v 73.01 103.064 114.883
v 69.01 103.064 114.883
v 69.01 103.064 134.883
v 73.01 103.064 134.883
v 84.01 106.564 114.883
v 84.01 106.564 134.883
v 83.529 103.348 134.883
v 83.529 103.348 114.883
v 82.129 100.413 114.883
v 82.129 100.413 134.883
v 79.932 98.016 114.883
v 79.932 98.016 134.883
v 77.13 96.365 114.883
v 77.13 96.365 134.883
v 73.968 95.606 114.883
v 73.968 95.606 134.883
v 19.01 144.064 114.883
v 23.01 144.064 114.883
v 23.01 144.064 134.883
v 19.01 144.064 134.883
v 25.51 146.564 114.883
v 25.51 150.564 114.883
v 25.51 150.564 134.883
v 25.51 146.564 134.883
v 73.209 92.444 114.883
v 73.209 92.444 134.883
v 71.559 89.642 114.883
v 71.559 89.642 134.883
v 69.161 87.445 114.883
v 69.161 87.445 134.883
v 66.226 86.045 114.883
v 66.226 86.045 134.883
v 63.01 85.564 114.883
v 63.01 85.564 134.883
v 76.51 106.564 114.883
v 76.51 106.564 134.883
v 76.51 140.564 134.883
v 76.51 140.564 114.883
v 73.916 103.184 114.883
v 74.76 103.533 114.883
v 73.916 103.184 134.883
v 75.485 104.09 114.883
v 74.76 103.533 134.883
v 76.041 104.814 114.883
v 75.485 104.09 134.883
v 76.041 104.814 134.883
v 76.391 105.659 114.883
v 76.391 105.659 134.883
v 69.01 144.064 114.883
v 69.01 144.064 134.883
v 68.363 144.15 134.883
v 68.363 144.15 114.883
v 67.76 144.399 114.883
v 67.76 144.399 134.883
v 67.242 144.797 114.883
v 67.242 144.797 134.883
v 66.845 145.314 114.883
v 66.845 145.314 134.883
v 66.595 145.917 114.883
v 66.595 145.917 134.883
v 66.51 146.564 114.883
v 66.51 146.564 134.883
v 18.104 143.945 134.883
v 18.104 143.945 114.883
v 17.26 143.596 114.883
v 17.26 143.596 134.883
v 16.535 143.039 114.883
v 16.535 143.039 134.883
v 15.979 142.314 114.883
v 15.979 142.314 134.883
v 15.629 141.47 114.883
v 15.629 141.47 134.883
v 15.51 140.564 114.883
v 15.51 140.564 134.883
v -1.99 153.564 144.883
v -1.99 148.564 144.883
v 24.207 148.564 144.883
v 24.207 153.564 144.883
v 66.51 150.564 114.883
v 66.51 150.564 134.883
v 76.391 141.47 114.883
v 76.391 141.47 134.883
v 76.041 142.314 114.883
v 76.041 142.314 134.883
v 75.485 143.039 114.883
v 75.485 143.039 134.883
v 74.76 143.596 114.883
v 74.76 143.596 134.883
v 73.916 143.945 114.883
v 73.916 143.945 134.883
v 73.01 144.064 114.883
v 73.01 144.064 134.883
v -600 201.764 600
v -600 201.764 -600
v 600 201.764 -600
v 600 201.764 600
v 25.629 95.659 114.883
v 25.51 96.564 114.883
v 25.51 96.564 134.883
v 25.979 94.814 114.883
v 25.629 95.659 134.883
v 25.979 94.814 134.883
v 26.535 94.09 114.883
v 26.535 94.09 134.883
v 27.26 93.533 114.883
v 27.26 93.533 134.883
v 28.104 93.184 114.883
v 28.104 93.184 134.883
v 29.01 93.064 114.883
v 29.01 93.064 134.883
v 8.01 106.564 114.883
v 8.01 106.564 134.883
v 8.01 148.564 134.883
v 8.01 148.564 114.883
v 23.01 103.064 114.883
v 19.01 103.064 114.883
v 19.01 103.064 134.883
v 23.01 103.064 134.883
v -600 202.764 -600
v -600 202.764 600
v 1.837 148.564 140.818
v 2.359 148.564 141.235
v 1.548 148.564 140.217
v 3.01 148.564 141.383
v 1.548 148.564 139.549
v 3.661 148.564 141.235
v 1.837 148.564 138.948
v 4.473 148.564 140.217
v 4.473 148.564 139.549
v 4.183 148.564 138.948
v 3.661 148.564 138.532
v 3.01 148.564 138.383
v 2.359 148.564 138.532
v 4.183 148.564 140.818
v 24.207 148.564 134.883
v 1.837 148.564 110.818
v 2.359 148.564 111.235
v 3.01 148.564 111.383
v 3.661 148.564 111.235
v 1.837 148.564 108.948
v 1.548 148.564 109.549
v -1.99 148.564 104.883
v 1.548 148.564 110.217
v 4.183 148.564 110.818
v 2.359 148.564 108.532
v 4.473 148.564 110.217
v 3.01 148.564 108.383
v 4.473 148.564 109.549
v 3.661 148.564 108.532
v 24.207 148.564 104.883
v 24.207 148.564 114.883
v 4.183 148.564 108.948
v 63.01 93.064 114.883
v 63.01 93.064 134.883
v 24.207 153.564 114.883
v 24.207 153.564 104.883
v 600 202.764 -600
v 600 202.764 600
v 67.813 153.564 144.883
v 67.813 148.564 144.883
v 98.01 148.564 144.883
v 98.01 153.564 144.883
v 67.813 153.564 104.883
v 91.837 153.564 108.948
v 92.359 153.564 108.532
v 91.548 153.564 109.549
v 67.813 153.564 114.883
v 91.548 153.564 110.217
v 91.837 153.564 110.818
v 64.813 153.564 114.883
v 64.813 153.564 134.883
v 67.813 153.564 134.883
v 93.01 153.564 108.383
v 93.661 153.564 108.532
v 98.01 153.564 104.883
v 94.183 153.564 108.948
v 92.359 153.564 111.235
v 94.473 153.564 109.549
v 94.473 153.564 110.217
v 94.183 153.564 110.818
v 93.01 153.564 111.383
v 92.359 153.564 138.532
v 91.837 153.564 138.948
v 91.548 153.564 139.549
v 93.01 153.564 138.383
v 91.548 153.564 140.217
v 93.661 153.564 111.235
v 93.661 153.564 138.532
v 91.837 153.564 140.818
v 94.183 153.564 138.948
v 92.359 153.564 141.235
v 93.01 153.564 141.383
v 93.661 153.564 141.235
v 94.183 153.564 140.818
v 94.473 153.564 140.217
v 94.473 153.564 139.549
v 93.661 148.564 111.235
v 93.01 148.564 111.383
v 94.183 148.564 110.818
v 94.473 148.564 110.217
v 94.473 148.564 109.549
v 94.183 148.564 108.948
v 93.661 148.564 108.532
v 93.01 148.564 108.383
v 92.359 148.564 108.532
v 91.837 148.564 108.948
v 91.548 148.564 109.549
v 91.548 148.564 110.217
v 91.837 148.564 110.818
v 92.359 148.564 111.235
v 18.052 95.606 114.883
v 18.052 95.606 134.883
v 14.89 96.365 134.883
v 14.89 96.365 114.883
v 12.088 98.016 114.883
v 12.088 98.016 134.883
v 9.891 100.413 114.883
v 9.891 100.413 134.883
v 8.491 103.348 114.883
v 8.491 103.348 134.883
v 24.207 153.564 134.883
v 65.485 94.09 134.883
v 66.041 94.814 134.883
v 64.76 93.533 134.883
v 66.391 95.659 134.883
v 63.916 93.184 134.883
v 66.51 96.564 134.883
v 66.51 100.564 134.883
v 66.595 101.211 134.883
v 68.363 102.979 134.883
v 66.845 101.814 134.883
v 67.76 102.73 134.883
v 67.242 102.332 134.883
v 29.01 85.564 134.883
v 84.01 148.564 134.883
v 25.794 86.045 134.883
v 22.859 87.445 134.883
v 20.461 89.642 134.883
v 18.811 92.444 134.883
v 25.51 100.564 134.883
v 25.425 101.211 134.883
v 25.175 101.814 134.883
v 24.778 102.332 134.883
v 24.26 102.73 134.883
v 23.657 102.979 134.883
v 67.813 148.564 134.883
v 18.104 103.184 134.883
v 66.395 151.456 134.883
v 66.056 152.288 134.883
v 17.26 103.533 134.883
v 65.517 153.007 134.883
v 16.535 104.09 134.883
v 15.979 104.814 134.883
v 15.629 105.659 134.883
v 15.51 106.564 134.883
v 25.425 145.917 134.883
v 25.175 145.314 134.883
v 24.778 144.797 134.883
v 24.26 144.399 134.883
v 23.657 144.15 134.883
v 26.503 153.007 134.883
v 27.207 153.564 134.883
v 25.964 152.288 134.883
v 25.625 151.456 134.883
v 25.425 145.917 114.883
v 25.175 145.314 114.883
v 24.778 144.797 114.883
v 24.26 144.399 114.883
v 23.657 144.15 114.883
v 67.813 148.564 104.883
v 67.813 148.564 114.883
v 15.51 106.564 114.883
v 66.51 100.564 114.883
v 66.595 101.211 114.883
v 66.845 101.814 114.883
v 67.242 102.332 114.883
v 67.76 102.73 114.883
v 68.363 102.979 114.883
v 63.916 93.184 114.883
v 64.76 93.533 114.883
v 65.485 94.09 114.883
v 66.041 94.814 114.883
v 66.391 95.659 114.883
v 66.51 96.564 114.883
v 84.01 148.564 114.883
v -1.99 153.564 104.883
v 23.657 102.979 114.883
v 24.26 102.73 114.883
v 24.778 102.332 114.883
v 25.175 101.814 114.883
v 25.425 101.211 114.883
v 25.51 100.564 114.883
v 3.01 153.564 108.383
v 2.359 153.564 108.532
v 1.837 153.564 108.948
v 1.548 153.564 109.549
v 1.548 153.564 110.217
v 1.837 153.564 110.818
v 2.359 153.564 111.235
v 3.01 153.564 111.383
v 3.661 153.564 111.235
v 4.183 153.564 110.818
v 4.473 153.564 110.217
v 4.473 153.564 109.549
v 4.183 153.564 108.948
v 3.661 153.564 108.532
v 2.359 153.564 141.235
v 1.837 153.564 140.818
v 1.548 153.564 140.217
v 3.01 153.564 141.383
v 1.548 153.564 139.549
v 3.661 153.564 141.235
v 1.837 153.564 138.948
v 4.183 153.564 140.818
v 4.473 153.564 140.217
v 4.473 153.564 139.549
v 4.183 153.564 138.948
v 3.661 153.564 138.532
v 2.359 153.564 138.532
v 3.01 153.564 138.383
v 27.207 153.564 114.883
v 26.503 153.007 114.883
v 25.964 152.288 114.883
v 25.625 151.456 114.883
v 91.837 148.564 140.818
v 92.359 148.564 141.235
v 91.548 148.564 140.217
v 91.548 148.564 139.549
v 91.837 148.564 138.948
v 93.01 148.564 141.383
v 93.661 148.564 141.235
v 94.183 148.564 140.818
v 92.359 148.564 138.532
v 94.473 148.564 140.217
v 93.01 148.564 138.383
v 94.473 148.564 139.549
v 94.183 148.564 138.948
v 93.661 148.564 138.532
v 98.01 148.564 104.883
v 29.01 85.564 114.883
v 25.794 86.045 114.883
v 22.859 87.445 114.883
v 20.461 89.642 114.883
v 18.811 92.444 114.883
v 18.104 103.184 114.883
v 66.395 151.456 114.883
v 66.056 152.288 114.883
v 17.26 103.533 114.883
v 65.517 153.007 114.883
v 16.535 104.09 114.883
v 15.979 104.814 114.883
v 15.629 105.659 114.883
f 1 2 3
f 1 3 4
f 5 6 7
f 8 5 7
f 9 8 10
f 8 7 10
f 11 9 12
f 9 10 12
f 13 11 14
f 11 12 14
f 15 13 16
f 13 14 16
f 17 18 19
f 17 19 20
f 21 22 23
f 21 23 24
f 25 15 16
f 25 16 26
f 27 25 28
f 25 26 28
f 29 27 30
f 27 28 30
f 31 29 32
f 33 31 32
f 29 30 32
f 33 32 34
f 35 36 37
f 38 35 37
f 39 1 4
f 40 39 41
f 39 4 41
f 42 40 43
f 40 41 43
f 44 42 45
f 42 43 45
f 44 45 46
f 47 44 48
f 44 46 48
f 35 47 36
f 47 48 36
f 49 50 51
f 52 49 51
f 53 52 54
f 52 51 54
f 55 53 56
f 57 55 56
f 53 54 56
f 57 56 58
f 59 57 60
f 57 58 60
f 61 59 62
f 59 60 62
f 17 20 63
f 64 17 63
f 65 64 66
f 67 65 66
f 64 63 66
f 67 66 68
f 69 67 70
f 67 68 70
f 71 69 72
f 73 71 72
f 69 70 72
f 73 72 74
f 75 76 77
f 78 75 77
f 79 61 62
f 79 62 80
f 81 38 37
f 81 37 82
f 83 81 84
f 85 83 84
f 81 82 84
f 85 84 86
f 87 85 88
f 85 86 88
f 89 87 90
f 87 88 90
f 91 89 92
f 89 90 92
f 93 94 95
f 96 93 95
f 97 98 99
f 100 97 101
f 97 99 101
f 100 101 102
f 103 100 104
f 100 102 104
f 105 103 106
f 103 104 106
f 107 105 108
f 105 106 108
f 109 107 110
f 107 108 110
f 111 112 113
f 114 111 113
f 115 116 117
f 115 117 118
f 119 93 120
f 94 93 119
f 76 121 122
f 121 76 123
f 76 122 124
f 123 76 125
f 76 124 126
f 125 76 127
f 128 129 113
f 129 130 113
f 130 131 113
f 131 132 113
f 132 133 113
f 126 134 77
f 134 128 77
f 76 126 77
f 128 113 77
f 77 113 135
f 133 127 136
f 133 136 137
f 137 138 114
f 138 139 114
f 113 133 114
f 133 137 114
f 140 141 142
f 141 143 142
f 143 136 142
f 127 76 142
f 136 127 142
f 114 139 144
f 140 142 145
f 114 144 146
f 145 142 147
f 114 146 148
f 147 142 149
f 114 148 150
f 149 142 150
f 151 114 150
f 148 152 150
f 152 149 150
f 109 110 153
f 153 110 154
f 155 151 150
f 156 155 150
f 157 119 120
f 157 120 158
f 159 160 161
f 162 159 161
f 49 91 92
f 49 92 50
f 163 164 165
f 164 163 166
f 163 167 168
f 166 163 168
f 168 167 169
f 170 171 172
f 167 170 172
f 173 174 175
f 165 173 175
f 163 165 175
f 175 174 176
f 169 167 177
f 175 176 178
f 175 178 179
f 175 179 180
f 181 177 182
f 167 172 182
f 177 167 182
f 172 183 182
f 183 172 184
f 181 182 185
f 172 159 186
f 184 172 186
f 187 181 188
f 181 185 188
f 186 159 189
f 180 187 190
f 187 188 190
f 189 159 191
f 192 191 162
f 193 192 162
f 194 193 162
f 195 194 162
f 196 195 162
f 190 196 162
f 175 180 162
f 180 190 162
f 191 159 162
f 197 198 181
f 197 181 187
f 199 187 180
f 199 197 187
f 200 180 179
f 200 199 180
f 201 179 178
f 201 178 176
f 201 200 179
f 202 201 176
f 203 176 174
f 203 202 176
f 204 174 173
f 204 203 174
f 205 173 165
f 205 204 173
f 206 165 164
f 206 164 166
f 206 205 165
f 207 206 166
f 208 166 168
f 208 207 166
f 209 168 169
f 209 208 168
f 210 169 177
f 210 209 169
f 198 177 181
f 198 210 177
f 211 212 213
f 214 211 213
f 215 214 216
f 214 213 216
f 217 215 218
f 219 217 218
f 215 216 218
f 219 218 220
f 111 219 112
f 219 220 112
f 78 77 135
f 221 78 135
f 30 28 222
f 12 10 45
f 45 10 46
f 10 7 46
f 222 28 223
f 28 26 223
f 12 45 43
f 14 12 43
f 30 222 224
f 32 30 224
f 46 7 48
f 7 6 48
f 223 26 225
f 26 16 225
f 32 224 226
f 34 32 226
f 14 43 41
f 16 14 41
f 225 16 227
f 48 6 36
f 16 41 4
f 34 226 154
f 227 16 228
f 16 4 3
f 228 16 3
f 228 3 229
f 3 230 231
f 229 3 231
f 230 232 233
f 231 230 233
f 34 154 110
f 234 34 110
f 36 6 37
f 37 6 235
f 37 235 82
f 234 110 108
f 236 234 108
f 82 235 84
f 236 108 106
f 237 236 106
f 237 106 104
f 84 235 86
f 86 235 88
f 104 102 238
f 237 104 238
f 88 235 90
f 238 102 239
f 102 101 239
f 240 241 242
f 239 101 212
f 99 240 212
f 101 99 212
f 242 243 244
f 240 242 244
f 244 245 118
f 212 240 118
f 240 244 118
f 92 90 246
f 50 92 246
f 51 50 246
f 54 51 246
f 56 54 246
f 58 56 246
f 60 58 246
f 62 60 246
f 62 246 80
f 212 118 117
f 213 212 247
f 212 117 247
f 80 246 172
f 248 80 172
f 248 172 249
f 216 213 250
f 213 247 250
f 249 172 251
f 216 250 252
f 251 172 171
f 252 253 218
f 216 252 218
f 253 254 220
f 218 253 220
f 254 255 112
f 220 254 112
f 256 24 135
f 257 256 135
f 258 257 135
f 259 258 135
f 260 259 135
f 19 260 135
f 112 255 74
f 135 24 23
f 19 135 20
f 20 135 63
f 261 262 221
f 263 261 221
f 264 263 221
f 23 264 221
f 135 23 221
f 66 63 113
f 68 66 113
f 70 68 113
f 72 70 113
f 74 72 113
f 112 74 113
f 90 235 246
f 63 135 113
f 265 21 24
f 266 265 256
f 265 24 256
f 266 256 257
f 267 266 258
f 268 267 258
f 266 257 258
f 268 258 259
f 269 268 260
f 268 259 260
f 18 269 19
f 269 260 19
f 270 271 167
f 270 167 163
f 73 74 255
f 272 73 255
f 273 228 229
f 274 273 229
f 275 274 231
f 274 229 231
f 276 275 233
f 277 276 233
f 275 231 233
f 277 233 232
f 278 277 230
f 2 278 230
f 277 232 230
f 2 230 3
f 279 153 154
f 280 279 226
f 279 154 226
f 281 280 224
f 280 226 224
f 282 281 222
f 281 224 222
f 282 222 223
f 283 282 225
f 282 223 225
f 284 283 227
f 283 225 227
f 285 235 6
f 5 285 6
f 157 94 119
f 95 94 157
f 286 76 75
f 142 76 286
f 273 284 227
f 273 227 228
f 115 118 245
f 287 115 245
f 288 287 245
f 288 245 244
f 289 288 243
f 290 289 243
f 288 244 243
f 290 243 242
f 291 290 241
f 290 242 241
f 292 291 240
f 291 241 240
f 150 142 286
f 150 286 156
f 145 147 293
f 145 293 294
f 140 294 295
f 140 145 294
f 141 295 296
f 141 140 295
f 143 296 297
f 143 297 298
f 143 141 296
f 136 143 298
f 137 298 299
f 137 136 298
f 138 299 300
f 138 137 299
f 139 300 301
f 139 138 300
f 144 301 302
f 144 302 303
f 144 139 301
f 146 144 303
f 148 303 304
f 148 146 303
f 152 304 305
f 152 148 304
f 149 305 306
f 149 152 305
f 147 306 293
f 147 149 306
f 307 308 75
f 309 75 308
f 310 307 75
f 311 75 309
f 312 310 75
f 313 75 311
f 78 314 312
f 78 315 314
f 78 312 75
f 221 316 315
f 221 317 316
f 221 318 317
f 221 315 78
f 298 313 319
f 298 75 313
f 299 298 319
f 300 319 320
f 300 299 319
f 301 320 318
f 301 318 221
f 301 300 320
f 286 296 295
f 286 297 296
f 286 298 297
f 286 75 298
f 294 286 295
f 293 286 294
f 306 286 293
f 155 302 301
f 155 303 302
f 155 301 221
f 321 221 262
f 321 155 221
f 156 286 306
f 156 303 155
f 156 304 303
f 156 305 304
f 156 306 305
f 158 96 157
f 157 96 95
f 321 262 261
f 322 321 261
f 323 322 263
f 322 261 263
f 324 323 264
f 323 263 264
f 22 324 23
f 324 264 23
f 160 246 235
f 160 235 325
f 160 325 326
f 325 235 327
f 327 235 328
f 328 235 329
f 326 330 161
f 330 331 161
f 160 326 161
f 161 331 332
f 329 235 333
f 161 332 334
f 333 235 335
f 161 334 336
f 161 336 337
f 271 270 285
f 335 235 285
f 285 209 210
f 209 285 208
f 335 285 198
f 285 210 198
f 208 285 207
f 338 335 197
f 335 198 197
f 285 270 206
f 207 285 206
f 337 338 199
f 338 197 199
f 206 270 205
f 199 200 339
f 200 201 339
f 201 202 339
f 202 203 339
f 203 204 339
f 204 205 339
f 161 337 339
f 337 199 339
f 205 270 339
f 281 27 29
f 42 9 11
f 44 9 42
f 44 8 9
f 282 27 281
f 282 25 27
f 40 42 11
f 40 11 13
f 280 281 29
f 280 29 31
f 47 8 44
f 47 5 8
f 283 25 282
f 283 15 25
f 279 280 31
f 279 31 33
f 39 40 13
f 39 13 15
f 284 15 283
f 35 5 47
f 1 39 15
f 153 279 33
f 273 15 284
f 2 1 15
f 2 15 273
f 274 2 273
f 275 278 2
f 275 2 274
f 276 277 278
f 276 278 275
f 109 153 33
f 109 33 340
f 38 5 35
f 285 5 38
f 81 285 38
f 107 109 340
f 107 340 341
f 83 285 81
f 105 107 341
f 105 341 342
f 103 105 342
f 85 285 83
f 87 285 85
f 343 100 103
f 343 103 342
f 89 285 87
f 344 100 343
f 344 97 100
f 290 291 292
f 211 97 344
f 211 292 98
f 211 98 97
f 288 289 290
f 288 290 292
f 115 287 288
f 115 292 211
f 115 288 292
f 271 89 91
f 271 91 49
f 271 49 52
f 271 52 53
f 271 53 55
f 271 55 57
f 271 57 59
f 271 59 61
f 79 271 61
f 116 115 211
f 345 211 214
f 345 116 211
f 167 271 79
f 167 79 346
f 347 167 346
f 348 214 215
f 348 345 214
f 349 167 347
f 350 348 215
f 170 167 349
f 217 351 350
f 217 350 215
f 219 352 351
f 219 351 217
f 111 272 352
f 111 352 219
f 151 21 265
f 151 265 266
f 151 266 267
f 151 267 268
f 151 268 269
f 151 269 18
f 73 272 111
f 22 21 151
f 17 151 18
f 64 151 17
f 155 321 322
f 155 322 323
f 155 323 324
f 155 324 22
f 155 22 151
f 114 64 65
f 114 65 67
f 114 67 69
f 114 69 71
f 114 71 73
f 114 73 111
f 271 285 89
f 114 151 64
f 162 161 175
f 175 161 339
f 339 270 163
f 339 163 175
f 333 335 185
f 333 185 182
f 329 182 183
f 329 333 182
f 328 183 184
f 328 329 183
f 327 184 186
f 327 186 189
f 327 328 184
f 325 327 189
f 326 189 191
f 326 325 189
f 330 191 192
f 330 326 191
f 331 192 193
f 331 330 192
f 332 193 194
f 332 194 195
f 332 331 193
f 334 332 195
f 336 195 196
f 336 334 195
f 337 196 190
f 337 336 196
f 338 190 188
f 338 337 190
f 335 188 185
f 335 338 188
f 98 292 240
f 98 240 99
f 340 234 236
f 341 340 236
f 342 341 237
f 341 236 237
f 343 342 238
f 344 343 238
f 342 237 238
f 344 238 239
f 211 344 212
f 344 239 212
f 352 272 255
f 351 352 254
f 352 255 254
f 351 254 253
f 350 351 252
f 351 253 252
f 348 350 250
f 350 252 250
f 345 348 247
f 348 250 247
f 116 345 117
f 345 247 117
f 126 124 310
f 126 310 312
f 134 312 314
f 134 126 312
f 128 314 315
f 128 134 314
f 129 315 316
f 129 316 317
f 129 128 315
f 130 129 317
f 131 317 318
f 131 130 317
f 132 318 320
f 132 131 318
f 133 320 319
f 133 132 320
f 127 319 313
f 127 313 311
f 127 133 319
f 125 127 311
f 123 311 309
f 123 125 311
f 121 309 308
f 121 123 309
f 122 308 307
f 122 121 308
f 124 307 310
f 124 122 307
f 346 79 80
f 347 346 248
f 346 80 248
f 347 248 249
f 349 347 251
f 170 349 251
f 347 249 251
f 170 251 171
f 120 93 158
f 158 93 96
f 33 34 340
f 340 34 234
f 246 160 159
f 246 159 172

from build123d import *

# Parameters (mm, degrees)
BOSS_EXTRUDE1_DEPTH = 20
BOSS_EXTRUDE2_START = -5
SKETCH3_W           = 26.197224363
SKETCH3_H           = 40
SKETCH3_R           = 1.5
SKETCH3_W_2         = 30.197224362
BOSS_EXTRUDE2_DEPTH = 5
SKETCH4_W           = 1200
SKETCH4_H           = 1200
BOSS_EXTRUDE3_DEPTH = 1


with BuildPart() as part:
    # Sketch2 → Boss-Extrude1 (new body)
    with BuildSketch(Plane(origin=(0, 0, 134.88320255), x_dir=(-1, 0, 0), z_dir=(0, 0, -1))):
        with BuildLine():
            Line((-8.010113394, 153.56443927), (-27.207337757, 153.56443927))
            ThreePointArc((-27.207337757, 153.56443927), (-25.963827563, 152.287849446), (-25.510113394, 150.56443927))
            Line((-25.510113394, 150.56443927), (-25.510113394, 146.56443927))
            ThreePointArc((-25.510113394, 146.56443927), (-24.777880347, 144.796672317), (-23.010113394, 144.06443927))
            Line((-23.010113394, 144.06443927), (-19.010113394, 144.06443927))
            ThreePointArc((-19.010113394, 144.06443927), (-16.53523966, 143.039313005), (-15.510113394, 140.56443927))
            Line((-15.510113394, 140.56443927), (-15.510113394, 106.56443927))
            ThreePointArc((-15.510113394, 106.56443927), (-16.53523966, 104.089565536), (-19.010113394, 103.06443927))
            Line((-19.010113394, 103.06443927), (-23.010113394, 103.06443927))
            ThreePointArc((-23.010113394, 103.06443927), (-24.777880347, 102.332206223), (-25.510113394, 100.56443927))
            Line((-25.510113394, 100.56443927), (-25.510113394, 96.56443927))
            ThreePointArc((-25.510113394, 96.56443927), (-26.53523966, 94.089565536), (-29.010113394, 93.06443927))
            Line((-29.010113394, 93.06443927), (-63.010113394, 93.06443927))
            ThreePointArc((-63.010113394, 93.06443927), (-65.484987129, 94.089565536), (-66.510113394, 96.56443927))
            Line((-66.510113394, 96.56443927), (-66.510113394, 100.56443927))
            ThreePointArc((-66.510113394, 100.56443927), (-67.242346441, 102.332206223), (-69.010113394, 103.06443927))
            Line((-69.010113394, 103.06443927), (-73.010113394, 103.06443927))
            ThreePointArc((-73.010113394, 103.06443927), (-75.484987129, 104.089565536), (-76.510113394, 106.56443927))
            Line((-76.510113394, 106.56443927), (-76.510113394, 140.56443927))
            ThreePointArc((-76.510113394, 140.56443927), (-75.484987129, 143.039313005), (-73.010113394, 144.06443927))
            Line((-73.010113394, 144.06443927), (-69.010113394, 144.06443927))
            ThreePointArc((-69.010113394, 144.06443927), (-67.242346441, 144.796672317), (-66.510113394, 146.56443927))
            Line((-66.510113394, 146.56443927), (-66.510113394, 150.56443927))
            ThreePointArc((-66.510113394, 150.56443927), (-66.056399226, 152.287849446), (-64.812889032, 153.56443927))
            Line((-64.812889032, 153.56443927), (-84.010113394, 153.56443927))
            Line((-84.010113394, 153.56443927), (-84.010113394, 140.56443927))
            Line((-84.010113394, 140.56443927), (-84.010113394, 106.56443927))
            ThreePointArc((-84.010113394, 106.56443927), (-81.119985899, 99.13275252), (-73.968301038, 95.606251627))
            ThreePointArc((-73.968301038, 95.606251627), (-70.441800145, 88.454566766), (-63.010113394, 85.56443927))
            Line((-63.010113394, 85.56443927), (-29.010113394, 85.56443927))
            ThreePointArc((-29.010113394, 85.56443927), (-21.578426644, 88.454566766), (-18.051925751, 95.606251627))
            ThreePointArc((-18.051925751, 95.606251627), (-10.90024089, 99.13275252), (-8.010113394, 106.56443927))
            Line((-8.010113394, 106.56443927), (-8.010113394, 140.56443927))
            Line((-8.010113394, 140.56443927), (-8.010113394, 153.56443927))
        make_face()
    extrude(amount=BOSS_EXTRUDE1_DEPTH)

    # Sketch3 → Boss-Extrude2 (add)
    # profile 1 of 2: a face of its own
    with BuildSketch(Plane(origin=(0, 153.56443927, 0), x_dir=(1, 0, 0), z_dir=(0, 1, 0)).offset(BOSS_EXTRUDE2_START)):
        with Locations((11.108725576, -124.88320255)):
            Rectangle(SKETCH3_W, SKETCH3_H)
        with Locations(Location((3.010113394, -139.88320255, 0), (0, 0, 270))):
            Circle(SKETCH3_R, mode=Mode.SUBTRACT)
        with Locations(Location((3.010113394, -109.88320255, 0), (0, 0, 90))):
            Circle(SKETCH3_R, mode=Mode.SUBTRACT)
    # profile 2 of 2: a face of its own
    with BuildSketch(Plane(origin=(0, 153.56443927, 0), x_dir=(1, 0, 0), z_dir=(0, 1, 0)).offset(BOSS_EXTRUDE2_START)):
        with Locations((82.911501213, -124.88320255)):
            Rectangle(SKETCH3_W_2, SKETCH3_H)
        with Locations(Location((93.010113394, -109.88320255, 0), (0, 0, 270))):
            Circle(SKETCH3_R, mode=Mode.SUBTRACT)
        with Locations(Location((93.010113394, -139.88320255, 0), (0, 0, 90))):
            Circle(SKETCH3_R, mode=Mode.SUBTRACT)
    extrude(amount=BOSS_EXTRUDE2_DEPTH)


with BuildPart() as body_2:
    # Sketch4 → Boss-Extrude3 (new body)
    with BuildSketch(Plane(origin=(0, 201.76443927, 0), x_dir=(1, 0, 0), z_dir=(0, 1, 0))):
        Rectangle(SKETCH4_W, SKETCH4_H)
    extrude(amount=BOSS_EXTRUDE3_DEPTH)


solid = Compound([part.part, body_2.part])
